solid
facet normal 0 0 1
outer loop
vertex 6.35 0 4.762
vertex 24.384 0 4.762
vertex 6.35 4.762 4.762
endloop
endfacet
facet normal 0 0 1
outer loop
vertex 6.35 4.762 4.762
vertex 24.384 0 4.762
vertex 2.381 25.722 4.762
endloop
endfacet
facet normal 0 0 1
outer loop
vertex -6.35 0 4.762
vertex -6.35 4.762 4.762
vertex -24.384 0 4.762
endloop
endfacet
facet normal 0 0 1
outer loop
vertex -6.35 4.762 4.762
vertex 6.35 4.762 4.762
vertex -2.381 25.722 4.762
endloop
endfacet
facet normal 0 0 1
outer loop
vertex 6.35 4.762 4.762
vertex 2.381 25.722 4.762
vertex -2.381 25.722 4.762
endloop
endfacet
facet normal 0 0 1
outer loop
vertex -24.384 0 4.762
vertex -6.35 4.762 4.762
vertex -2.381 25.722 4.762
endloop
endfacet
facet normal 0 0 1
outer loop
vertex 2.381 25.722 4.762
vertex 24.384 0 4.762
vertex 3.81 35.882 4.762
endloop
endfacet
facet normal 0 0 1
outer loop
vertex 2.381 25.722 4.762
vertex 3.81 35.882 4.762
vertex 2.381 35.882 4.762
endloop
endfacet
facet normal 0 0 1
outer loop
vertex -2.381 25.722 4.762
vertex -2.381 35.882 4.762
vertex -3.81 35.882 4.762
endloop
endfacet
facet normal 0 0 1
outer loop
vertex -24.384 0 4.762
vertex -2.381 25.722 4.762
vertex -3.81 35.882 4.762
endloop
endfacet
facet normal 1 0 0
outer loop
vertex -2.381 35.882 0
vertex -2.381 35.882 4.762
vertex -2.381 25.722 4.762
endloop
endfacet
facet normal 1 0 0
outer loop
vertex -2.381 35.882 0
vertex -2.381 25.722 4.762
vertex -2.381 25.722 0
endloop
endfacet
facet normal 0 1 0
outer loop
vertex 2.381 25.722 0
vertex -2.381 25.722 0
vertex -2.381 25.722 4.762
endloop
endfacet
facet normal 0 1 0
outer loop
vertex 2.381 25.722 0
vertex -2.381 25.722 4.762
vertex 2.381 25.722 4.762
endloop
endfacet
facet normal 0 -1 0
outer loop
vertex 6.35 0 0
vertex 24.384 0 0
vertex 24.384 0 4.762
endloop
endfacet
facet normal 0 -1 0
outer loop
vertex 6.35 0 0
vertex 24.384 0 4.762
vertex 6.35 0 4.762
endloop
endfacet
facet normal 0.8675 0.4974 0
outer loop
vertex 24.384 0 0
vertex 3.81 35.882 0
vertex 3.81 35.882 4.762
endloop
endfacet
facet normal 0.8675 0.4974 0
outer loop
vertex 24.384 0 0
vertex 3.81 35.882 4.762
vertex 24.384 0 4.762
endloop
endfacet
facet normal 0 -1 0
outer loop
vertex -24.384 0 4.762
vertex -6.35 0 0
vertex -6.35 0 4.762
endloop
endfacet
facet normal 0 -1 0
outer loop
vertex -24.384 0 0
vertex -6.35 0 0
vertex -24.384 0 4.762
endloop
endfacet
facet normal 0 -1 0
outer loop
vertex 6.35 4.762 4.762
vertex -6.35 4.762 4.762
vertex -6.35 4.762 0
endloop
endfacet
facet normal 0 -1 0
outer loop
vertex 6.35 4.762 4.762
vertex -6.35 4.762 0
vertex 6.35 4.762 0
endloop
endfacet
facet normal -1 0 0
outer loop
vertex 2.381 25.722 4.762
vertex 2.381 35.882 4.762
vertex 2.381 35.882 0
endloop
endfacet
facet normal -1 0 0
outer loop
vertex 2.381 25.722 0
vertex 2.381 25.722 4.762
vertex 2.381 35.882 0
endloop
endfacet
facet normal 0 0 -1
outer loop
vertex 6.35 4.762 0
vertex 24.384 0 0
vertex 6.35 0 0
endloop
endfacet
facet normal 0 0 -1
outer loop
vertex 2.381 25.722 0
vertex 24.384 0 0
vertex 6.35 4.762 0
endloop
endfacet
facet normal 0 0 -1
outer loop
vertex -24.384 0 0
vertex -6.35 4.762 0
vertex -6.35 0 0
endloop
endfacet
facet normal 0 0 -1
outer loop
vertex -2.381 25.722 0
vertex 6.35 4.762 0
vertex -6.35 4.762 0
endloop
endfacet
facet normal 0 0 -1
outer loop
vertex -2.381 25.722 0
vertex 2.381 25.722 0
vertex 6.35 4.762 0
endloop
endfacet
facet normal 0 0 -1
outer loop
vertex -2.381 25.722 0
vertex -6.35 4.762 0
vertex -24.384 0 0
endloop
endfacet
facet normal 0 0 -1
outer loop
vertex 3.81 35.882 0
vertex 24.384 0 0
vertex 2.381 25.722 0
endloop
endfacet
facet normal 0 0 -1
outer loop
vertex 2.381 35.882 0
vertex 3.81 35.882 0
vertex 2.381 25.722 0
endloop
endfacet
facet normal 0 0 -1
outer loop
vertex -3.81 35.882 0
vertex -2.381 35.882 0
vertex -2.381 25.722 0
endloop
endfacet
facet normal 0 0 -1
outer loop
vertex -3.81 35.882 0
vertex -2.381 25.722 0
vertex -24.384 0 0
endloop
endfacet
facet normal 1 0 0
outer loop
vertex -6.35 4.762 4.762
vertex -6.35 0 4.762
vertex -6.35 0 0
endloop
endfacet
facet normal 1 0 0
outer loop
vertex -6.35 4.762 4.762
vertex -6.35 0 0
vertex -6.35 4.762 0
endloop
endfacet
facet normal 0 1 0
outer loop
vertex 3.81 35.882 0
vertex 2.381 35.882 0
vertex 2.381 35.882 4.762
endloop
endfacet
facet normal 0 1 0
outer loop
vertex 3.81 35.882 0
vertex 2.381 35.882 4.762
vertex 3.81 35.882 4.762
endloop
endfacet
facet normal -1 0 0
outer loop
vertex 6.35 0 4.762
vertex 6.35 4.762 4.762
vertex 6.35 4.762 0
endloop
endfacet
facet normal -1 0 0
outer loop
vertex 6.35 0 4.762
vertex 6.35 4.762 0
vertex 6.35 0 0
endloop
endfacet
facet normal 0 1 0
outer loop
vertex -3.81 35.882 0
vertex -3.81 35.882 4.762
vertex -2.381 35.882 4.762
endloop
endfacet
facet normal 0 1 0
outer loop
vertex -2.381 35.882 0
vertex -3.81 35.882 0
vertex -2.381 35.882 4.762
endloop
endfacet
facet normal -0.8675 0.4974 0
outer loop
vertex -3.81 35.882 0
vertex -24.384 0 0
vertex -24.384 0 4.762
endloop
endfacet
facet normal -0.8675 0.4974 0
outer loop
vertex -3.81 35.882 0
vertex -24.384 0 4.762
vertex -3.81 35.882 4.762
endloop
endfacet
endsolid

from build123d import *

# Parameters (mm, degrees)
BOSS_EXTRUDE1_DEPTH = 4.7625
CUT_EXTRUDE1_DEPTH  = 50.252795761
SKETCH4_W           = 4.7625
SKETCH4_H           = 4.7625
CUT_EXTRUDE2_DEPTH  = 10.16


with BuildPart() as part:
    # Sketch1 → Boss-Extrude1 (new body)
    with BuildSketch(Plane.XY):
        Polygon((0, 42.527367988), (24.384, 0), (-24.384, 0), align=None)
    extrude(amount=BOSS_EXTRUDE1_DEPTH)

    # Sketch2 → Cut-Extrude1 (cut, through all)
    with BuildSketch(Plane.XY.offset(4.7625)):
        Polygon((0, 0), (-6.35, 0), (-6.35, 4.7625), (6.35, 4.7625), (6.35, 0), align=None)
        Polygon((0, 42.527367988), (-3.81, 35.88246674), (3.81, 35.88246674), align=None)
    extrude(amount=-CUT_EXTRUDE1_DEPTH, mode=Mode.SUBTRACT)

    # Sketch4 → Cut-Extrude2 (cut)
    with BuildSketch(Plane(origin=(0, 35.88246674, 0), x_dir=(1, 0, 0), z_dir=(0, 1, 0))):
        with Locations((0, -2.38125)):
            Rectangle(SKETCH4_W, SKETCH4_H)
    extrude(amount=-CUT_EXTRUDE2_DEPTH, mode=Mode.SUBTRACT)


solid = part.part
